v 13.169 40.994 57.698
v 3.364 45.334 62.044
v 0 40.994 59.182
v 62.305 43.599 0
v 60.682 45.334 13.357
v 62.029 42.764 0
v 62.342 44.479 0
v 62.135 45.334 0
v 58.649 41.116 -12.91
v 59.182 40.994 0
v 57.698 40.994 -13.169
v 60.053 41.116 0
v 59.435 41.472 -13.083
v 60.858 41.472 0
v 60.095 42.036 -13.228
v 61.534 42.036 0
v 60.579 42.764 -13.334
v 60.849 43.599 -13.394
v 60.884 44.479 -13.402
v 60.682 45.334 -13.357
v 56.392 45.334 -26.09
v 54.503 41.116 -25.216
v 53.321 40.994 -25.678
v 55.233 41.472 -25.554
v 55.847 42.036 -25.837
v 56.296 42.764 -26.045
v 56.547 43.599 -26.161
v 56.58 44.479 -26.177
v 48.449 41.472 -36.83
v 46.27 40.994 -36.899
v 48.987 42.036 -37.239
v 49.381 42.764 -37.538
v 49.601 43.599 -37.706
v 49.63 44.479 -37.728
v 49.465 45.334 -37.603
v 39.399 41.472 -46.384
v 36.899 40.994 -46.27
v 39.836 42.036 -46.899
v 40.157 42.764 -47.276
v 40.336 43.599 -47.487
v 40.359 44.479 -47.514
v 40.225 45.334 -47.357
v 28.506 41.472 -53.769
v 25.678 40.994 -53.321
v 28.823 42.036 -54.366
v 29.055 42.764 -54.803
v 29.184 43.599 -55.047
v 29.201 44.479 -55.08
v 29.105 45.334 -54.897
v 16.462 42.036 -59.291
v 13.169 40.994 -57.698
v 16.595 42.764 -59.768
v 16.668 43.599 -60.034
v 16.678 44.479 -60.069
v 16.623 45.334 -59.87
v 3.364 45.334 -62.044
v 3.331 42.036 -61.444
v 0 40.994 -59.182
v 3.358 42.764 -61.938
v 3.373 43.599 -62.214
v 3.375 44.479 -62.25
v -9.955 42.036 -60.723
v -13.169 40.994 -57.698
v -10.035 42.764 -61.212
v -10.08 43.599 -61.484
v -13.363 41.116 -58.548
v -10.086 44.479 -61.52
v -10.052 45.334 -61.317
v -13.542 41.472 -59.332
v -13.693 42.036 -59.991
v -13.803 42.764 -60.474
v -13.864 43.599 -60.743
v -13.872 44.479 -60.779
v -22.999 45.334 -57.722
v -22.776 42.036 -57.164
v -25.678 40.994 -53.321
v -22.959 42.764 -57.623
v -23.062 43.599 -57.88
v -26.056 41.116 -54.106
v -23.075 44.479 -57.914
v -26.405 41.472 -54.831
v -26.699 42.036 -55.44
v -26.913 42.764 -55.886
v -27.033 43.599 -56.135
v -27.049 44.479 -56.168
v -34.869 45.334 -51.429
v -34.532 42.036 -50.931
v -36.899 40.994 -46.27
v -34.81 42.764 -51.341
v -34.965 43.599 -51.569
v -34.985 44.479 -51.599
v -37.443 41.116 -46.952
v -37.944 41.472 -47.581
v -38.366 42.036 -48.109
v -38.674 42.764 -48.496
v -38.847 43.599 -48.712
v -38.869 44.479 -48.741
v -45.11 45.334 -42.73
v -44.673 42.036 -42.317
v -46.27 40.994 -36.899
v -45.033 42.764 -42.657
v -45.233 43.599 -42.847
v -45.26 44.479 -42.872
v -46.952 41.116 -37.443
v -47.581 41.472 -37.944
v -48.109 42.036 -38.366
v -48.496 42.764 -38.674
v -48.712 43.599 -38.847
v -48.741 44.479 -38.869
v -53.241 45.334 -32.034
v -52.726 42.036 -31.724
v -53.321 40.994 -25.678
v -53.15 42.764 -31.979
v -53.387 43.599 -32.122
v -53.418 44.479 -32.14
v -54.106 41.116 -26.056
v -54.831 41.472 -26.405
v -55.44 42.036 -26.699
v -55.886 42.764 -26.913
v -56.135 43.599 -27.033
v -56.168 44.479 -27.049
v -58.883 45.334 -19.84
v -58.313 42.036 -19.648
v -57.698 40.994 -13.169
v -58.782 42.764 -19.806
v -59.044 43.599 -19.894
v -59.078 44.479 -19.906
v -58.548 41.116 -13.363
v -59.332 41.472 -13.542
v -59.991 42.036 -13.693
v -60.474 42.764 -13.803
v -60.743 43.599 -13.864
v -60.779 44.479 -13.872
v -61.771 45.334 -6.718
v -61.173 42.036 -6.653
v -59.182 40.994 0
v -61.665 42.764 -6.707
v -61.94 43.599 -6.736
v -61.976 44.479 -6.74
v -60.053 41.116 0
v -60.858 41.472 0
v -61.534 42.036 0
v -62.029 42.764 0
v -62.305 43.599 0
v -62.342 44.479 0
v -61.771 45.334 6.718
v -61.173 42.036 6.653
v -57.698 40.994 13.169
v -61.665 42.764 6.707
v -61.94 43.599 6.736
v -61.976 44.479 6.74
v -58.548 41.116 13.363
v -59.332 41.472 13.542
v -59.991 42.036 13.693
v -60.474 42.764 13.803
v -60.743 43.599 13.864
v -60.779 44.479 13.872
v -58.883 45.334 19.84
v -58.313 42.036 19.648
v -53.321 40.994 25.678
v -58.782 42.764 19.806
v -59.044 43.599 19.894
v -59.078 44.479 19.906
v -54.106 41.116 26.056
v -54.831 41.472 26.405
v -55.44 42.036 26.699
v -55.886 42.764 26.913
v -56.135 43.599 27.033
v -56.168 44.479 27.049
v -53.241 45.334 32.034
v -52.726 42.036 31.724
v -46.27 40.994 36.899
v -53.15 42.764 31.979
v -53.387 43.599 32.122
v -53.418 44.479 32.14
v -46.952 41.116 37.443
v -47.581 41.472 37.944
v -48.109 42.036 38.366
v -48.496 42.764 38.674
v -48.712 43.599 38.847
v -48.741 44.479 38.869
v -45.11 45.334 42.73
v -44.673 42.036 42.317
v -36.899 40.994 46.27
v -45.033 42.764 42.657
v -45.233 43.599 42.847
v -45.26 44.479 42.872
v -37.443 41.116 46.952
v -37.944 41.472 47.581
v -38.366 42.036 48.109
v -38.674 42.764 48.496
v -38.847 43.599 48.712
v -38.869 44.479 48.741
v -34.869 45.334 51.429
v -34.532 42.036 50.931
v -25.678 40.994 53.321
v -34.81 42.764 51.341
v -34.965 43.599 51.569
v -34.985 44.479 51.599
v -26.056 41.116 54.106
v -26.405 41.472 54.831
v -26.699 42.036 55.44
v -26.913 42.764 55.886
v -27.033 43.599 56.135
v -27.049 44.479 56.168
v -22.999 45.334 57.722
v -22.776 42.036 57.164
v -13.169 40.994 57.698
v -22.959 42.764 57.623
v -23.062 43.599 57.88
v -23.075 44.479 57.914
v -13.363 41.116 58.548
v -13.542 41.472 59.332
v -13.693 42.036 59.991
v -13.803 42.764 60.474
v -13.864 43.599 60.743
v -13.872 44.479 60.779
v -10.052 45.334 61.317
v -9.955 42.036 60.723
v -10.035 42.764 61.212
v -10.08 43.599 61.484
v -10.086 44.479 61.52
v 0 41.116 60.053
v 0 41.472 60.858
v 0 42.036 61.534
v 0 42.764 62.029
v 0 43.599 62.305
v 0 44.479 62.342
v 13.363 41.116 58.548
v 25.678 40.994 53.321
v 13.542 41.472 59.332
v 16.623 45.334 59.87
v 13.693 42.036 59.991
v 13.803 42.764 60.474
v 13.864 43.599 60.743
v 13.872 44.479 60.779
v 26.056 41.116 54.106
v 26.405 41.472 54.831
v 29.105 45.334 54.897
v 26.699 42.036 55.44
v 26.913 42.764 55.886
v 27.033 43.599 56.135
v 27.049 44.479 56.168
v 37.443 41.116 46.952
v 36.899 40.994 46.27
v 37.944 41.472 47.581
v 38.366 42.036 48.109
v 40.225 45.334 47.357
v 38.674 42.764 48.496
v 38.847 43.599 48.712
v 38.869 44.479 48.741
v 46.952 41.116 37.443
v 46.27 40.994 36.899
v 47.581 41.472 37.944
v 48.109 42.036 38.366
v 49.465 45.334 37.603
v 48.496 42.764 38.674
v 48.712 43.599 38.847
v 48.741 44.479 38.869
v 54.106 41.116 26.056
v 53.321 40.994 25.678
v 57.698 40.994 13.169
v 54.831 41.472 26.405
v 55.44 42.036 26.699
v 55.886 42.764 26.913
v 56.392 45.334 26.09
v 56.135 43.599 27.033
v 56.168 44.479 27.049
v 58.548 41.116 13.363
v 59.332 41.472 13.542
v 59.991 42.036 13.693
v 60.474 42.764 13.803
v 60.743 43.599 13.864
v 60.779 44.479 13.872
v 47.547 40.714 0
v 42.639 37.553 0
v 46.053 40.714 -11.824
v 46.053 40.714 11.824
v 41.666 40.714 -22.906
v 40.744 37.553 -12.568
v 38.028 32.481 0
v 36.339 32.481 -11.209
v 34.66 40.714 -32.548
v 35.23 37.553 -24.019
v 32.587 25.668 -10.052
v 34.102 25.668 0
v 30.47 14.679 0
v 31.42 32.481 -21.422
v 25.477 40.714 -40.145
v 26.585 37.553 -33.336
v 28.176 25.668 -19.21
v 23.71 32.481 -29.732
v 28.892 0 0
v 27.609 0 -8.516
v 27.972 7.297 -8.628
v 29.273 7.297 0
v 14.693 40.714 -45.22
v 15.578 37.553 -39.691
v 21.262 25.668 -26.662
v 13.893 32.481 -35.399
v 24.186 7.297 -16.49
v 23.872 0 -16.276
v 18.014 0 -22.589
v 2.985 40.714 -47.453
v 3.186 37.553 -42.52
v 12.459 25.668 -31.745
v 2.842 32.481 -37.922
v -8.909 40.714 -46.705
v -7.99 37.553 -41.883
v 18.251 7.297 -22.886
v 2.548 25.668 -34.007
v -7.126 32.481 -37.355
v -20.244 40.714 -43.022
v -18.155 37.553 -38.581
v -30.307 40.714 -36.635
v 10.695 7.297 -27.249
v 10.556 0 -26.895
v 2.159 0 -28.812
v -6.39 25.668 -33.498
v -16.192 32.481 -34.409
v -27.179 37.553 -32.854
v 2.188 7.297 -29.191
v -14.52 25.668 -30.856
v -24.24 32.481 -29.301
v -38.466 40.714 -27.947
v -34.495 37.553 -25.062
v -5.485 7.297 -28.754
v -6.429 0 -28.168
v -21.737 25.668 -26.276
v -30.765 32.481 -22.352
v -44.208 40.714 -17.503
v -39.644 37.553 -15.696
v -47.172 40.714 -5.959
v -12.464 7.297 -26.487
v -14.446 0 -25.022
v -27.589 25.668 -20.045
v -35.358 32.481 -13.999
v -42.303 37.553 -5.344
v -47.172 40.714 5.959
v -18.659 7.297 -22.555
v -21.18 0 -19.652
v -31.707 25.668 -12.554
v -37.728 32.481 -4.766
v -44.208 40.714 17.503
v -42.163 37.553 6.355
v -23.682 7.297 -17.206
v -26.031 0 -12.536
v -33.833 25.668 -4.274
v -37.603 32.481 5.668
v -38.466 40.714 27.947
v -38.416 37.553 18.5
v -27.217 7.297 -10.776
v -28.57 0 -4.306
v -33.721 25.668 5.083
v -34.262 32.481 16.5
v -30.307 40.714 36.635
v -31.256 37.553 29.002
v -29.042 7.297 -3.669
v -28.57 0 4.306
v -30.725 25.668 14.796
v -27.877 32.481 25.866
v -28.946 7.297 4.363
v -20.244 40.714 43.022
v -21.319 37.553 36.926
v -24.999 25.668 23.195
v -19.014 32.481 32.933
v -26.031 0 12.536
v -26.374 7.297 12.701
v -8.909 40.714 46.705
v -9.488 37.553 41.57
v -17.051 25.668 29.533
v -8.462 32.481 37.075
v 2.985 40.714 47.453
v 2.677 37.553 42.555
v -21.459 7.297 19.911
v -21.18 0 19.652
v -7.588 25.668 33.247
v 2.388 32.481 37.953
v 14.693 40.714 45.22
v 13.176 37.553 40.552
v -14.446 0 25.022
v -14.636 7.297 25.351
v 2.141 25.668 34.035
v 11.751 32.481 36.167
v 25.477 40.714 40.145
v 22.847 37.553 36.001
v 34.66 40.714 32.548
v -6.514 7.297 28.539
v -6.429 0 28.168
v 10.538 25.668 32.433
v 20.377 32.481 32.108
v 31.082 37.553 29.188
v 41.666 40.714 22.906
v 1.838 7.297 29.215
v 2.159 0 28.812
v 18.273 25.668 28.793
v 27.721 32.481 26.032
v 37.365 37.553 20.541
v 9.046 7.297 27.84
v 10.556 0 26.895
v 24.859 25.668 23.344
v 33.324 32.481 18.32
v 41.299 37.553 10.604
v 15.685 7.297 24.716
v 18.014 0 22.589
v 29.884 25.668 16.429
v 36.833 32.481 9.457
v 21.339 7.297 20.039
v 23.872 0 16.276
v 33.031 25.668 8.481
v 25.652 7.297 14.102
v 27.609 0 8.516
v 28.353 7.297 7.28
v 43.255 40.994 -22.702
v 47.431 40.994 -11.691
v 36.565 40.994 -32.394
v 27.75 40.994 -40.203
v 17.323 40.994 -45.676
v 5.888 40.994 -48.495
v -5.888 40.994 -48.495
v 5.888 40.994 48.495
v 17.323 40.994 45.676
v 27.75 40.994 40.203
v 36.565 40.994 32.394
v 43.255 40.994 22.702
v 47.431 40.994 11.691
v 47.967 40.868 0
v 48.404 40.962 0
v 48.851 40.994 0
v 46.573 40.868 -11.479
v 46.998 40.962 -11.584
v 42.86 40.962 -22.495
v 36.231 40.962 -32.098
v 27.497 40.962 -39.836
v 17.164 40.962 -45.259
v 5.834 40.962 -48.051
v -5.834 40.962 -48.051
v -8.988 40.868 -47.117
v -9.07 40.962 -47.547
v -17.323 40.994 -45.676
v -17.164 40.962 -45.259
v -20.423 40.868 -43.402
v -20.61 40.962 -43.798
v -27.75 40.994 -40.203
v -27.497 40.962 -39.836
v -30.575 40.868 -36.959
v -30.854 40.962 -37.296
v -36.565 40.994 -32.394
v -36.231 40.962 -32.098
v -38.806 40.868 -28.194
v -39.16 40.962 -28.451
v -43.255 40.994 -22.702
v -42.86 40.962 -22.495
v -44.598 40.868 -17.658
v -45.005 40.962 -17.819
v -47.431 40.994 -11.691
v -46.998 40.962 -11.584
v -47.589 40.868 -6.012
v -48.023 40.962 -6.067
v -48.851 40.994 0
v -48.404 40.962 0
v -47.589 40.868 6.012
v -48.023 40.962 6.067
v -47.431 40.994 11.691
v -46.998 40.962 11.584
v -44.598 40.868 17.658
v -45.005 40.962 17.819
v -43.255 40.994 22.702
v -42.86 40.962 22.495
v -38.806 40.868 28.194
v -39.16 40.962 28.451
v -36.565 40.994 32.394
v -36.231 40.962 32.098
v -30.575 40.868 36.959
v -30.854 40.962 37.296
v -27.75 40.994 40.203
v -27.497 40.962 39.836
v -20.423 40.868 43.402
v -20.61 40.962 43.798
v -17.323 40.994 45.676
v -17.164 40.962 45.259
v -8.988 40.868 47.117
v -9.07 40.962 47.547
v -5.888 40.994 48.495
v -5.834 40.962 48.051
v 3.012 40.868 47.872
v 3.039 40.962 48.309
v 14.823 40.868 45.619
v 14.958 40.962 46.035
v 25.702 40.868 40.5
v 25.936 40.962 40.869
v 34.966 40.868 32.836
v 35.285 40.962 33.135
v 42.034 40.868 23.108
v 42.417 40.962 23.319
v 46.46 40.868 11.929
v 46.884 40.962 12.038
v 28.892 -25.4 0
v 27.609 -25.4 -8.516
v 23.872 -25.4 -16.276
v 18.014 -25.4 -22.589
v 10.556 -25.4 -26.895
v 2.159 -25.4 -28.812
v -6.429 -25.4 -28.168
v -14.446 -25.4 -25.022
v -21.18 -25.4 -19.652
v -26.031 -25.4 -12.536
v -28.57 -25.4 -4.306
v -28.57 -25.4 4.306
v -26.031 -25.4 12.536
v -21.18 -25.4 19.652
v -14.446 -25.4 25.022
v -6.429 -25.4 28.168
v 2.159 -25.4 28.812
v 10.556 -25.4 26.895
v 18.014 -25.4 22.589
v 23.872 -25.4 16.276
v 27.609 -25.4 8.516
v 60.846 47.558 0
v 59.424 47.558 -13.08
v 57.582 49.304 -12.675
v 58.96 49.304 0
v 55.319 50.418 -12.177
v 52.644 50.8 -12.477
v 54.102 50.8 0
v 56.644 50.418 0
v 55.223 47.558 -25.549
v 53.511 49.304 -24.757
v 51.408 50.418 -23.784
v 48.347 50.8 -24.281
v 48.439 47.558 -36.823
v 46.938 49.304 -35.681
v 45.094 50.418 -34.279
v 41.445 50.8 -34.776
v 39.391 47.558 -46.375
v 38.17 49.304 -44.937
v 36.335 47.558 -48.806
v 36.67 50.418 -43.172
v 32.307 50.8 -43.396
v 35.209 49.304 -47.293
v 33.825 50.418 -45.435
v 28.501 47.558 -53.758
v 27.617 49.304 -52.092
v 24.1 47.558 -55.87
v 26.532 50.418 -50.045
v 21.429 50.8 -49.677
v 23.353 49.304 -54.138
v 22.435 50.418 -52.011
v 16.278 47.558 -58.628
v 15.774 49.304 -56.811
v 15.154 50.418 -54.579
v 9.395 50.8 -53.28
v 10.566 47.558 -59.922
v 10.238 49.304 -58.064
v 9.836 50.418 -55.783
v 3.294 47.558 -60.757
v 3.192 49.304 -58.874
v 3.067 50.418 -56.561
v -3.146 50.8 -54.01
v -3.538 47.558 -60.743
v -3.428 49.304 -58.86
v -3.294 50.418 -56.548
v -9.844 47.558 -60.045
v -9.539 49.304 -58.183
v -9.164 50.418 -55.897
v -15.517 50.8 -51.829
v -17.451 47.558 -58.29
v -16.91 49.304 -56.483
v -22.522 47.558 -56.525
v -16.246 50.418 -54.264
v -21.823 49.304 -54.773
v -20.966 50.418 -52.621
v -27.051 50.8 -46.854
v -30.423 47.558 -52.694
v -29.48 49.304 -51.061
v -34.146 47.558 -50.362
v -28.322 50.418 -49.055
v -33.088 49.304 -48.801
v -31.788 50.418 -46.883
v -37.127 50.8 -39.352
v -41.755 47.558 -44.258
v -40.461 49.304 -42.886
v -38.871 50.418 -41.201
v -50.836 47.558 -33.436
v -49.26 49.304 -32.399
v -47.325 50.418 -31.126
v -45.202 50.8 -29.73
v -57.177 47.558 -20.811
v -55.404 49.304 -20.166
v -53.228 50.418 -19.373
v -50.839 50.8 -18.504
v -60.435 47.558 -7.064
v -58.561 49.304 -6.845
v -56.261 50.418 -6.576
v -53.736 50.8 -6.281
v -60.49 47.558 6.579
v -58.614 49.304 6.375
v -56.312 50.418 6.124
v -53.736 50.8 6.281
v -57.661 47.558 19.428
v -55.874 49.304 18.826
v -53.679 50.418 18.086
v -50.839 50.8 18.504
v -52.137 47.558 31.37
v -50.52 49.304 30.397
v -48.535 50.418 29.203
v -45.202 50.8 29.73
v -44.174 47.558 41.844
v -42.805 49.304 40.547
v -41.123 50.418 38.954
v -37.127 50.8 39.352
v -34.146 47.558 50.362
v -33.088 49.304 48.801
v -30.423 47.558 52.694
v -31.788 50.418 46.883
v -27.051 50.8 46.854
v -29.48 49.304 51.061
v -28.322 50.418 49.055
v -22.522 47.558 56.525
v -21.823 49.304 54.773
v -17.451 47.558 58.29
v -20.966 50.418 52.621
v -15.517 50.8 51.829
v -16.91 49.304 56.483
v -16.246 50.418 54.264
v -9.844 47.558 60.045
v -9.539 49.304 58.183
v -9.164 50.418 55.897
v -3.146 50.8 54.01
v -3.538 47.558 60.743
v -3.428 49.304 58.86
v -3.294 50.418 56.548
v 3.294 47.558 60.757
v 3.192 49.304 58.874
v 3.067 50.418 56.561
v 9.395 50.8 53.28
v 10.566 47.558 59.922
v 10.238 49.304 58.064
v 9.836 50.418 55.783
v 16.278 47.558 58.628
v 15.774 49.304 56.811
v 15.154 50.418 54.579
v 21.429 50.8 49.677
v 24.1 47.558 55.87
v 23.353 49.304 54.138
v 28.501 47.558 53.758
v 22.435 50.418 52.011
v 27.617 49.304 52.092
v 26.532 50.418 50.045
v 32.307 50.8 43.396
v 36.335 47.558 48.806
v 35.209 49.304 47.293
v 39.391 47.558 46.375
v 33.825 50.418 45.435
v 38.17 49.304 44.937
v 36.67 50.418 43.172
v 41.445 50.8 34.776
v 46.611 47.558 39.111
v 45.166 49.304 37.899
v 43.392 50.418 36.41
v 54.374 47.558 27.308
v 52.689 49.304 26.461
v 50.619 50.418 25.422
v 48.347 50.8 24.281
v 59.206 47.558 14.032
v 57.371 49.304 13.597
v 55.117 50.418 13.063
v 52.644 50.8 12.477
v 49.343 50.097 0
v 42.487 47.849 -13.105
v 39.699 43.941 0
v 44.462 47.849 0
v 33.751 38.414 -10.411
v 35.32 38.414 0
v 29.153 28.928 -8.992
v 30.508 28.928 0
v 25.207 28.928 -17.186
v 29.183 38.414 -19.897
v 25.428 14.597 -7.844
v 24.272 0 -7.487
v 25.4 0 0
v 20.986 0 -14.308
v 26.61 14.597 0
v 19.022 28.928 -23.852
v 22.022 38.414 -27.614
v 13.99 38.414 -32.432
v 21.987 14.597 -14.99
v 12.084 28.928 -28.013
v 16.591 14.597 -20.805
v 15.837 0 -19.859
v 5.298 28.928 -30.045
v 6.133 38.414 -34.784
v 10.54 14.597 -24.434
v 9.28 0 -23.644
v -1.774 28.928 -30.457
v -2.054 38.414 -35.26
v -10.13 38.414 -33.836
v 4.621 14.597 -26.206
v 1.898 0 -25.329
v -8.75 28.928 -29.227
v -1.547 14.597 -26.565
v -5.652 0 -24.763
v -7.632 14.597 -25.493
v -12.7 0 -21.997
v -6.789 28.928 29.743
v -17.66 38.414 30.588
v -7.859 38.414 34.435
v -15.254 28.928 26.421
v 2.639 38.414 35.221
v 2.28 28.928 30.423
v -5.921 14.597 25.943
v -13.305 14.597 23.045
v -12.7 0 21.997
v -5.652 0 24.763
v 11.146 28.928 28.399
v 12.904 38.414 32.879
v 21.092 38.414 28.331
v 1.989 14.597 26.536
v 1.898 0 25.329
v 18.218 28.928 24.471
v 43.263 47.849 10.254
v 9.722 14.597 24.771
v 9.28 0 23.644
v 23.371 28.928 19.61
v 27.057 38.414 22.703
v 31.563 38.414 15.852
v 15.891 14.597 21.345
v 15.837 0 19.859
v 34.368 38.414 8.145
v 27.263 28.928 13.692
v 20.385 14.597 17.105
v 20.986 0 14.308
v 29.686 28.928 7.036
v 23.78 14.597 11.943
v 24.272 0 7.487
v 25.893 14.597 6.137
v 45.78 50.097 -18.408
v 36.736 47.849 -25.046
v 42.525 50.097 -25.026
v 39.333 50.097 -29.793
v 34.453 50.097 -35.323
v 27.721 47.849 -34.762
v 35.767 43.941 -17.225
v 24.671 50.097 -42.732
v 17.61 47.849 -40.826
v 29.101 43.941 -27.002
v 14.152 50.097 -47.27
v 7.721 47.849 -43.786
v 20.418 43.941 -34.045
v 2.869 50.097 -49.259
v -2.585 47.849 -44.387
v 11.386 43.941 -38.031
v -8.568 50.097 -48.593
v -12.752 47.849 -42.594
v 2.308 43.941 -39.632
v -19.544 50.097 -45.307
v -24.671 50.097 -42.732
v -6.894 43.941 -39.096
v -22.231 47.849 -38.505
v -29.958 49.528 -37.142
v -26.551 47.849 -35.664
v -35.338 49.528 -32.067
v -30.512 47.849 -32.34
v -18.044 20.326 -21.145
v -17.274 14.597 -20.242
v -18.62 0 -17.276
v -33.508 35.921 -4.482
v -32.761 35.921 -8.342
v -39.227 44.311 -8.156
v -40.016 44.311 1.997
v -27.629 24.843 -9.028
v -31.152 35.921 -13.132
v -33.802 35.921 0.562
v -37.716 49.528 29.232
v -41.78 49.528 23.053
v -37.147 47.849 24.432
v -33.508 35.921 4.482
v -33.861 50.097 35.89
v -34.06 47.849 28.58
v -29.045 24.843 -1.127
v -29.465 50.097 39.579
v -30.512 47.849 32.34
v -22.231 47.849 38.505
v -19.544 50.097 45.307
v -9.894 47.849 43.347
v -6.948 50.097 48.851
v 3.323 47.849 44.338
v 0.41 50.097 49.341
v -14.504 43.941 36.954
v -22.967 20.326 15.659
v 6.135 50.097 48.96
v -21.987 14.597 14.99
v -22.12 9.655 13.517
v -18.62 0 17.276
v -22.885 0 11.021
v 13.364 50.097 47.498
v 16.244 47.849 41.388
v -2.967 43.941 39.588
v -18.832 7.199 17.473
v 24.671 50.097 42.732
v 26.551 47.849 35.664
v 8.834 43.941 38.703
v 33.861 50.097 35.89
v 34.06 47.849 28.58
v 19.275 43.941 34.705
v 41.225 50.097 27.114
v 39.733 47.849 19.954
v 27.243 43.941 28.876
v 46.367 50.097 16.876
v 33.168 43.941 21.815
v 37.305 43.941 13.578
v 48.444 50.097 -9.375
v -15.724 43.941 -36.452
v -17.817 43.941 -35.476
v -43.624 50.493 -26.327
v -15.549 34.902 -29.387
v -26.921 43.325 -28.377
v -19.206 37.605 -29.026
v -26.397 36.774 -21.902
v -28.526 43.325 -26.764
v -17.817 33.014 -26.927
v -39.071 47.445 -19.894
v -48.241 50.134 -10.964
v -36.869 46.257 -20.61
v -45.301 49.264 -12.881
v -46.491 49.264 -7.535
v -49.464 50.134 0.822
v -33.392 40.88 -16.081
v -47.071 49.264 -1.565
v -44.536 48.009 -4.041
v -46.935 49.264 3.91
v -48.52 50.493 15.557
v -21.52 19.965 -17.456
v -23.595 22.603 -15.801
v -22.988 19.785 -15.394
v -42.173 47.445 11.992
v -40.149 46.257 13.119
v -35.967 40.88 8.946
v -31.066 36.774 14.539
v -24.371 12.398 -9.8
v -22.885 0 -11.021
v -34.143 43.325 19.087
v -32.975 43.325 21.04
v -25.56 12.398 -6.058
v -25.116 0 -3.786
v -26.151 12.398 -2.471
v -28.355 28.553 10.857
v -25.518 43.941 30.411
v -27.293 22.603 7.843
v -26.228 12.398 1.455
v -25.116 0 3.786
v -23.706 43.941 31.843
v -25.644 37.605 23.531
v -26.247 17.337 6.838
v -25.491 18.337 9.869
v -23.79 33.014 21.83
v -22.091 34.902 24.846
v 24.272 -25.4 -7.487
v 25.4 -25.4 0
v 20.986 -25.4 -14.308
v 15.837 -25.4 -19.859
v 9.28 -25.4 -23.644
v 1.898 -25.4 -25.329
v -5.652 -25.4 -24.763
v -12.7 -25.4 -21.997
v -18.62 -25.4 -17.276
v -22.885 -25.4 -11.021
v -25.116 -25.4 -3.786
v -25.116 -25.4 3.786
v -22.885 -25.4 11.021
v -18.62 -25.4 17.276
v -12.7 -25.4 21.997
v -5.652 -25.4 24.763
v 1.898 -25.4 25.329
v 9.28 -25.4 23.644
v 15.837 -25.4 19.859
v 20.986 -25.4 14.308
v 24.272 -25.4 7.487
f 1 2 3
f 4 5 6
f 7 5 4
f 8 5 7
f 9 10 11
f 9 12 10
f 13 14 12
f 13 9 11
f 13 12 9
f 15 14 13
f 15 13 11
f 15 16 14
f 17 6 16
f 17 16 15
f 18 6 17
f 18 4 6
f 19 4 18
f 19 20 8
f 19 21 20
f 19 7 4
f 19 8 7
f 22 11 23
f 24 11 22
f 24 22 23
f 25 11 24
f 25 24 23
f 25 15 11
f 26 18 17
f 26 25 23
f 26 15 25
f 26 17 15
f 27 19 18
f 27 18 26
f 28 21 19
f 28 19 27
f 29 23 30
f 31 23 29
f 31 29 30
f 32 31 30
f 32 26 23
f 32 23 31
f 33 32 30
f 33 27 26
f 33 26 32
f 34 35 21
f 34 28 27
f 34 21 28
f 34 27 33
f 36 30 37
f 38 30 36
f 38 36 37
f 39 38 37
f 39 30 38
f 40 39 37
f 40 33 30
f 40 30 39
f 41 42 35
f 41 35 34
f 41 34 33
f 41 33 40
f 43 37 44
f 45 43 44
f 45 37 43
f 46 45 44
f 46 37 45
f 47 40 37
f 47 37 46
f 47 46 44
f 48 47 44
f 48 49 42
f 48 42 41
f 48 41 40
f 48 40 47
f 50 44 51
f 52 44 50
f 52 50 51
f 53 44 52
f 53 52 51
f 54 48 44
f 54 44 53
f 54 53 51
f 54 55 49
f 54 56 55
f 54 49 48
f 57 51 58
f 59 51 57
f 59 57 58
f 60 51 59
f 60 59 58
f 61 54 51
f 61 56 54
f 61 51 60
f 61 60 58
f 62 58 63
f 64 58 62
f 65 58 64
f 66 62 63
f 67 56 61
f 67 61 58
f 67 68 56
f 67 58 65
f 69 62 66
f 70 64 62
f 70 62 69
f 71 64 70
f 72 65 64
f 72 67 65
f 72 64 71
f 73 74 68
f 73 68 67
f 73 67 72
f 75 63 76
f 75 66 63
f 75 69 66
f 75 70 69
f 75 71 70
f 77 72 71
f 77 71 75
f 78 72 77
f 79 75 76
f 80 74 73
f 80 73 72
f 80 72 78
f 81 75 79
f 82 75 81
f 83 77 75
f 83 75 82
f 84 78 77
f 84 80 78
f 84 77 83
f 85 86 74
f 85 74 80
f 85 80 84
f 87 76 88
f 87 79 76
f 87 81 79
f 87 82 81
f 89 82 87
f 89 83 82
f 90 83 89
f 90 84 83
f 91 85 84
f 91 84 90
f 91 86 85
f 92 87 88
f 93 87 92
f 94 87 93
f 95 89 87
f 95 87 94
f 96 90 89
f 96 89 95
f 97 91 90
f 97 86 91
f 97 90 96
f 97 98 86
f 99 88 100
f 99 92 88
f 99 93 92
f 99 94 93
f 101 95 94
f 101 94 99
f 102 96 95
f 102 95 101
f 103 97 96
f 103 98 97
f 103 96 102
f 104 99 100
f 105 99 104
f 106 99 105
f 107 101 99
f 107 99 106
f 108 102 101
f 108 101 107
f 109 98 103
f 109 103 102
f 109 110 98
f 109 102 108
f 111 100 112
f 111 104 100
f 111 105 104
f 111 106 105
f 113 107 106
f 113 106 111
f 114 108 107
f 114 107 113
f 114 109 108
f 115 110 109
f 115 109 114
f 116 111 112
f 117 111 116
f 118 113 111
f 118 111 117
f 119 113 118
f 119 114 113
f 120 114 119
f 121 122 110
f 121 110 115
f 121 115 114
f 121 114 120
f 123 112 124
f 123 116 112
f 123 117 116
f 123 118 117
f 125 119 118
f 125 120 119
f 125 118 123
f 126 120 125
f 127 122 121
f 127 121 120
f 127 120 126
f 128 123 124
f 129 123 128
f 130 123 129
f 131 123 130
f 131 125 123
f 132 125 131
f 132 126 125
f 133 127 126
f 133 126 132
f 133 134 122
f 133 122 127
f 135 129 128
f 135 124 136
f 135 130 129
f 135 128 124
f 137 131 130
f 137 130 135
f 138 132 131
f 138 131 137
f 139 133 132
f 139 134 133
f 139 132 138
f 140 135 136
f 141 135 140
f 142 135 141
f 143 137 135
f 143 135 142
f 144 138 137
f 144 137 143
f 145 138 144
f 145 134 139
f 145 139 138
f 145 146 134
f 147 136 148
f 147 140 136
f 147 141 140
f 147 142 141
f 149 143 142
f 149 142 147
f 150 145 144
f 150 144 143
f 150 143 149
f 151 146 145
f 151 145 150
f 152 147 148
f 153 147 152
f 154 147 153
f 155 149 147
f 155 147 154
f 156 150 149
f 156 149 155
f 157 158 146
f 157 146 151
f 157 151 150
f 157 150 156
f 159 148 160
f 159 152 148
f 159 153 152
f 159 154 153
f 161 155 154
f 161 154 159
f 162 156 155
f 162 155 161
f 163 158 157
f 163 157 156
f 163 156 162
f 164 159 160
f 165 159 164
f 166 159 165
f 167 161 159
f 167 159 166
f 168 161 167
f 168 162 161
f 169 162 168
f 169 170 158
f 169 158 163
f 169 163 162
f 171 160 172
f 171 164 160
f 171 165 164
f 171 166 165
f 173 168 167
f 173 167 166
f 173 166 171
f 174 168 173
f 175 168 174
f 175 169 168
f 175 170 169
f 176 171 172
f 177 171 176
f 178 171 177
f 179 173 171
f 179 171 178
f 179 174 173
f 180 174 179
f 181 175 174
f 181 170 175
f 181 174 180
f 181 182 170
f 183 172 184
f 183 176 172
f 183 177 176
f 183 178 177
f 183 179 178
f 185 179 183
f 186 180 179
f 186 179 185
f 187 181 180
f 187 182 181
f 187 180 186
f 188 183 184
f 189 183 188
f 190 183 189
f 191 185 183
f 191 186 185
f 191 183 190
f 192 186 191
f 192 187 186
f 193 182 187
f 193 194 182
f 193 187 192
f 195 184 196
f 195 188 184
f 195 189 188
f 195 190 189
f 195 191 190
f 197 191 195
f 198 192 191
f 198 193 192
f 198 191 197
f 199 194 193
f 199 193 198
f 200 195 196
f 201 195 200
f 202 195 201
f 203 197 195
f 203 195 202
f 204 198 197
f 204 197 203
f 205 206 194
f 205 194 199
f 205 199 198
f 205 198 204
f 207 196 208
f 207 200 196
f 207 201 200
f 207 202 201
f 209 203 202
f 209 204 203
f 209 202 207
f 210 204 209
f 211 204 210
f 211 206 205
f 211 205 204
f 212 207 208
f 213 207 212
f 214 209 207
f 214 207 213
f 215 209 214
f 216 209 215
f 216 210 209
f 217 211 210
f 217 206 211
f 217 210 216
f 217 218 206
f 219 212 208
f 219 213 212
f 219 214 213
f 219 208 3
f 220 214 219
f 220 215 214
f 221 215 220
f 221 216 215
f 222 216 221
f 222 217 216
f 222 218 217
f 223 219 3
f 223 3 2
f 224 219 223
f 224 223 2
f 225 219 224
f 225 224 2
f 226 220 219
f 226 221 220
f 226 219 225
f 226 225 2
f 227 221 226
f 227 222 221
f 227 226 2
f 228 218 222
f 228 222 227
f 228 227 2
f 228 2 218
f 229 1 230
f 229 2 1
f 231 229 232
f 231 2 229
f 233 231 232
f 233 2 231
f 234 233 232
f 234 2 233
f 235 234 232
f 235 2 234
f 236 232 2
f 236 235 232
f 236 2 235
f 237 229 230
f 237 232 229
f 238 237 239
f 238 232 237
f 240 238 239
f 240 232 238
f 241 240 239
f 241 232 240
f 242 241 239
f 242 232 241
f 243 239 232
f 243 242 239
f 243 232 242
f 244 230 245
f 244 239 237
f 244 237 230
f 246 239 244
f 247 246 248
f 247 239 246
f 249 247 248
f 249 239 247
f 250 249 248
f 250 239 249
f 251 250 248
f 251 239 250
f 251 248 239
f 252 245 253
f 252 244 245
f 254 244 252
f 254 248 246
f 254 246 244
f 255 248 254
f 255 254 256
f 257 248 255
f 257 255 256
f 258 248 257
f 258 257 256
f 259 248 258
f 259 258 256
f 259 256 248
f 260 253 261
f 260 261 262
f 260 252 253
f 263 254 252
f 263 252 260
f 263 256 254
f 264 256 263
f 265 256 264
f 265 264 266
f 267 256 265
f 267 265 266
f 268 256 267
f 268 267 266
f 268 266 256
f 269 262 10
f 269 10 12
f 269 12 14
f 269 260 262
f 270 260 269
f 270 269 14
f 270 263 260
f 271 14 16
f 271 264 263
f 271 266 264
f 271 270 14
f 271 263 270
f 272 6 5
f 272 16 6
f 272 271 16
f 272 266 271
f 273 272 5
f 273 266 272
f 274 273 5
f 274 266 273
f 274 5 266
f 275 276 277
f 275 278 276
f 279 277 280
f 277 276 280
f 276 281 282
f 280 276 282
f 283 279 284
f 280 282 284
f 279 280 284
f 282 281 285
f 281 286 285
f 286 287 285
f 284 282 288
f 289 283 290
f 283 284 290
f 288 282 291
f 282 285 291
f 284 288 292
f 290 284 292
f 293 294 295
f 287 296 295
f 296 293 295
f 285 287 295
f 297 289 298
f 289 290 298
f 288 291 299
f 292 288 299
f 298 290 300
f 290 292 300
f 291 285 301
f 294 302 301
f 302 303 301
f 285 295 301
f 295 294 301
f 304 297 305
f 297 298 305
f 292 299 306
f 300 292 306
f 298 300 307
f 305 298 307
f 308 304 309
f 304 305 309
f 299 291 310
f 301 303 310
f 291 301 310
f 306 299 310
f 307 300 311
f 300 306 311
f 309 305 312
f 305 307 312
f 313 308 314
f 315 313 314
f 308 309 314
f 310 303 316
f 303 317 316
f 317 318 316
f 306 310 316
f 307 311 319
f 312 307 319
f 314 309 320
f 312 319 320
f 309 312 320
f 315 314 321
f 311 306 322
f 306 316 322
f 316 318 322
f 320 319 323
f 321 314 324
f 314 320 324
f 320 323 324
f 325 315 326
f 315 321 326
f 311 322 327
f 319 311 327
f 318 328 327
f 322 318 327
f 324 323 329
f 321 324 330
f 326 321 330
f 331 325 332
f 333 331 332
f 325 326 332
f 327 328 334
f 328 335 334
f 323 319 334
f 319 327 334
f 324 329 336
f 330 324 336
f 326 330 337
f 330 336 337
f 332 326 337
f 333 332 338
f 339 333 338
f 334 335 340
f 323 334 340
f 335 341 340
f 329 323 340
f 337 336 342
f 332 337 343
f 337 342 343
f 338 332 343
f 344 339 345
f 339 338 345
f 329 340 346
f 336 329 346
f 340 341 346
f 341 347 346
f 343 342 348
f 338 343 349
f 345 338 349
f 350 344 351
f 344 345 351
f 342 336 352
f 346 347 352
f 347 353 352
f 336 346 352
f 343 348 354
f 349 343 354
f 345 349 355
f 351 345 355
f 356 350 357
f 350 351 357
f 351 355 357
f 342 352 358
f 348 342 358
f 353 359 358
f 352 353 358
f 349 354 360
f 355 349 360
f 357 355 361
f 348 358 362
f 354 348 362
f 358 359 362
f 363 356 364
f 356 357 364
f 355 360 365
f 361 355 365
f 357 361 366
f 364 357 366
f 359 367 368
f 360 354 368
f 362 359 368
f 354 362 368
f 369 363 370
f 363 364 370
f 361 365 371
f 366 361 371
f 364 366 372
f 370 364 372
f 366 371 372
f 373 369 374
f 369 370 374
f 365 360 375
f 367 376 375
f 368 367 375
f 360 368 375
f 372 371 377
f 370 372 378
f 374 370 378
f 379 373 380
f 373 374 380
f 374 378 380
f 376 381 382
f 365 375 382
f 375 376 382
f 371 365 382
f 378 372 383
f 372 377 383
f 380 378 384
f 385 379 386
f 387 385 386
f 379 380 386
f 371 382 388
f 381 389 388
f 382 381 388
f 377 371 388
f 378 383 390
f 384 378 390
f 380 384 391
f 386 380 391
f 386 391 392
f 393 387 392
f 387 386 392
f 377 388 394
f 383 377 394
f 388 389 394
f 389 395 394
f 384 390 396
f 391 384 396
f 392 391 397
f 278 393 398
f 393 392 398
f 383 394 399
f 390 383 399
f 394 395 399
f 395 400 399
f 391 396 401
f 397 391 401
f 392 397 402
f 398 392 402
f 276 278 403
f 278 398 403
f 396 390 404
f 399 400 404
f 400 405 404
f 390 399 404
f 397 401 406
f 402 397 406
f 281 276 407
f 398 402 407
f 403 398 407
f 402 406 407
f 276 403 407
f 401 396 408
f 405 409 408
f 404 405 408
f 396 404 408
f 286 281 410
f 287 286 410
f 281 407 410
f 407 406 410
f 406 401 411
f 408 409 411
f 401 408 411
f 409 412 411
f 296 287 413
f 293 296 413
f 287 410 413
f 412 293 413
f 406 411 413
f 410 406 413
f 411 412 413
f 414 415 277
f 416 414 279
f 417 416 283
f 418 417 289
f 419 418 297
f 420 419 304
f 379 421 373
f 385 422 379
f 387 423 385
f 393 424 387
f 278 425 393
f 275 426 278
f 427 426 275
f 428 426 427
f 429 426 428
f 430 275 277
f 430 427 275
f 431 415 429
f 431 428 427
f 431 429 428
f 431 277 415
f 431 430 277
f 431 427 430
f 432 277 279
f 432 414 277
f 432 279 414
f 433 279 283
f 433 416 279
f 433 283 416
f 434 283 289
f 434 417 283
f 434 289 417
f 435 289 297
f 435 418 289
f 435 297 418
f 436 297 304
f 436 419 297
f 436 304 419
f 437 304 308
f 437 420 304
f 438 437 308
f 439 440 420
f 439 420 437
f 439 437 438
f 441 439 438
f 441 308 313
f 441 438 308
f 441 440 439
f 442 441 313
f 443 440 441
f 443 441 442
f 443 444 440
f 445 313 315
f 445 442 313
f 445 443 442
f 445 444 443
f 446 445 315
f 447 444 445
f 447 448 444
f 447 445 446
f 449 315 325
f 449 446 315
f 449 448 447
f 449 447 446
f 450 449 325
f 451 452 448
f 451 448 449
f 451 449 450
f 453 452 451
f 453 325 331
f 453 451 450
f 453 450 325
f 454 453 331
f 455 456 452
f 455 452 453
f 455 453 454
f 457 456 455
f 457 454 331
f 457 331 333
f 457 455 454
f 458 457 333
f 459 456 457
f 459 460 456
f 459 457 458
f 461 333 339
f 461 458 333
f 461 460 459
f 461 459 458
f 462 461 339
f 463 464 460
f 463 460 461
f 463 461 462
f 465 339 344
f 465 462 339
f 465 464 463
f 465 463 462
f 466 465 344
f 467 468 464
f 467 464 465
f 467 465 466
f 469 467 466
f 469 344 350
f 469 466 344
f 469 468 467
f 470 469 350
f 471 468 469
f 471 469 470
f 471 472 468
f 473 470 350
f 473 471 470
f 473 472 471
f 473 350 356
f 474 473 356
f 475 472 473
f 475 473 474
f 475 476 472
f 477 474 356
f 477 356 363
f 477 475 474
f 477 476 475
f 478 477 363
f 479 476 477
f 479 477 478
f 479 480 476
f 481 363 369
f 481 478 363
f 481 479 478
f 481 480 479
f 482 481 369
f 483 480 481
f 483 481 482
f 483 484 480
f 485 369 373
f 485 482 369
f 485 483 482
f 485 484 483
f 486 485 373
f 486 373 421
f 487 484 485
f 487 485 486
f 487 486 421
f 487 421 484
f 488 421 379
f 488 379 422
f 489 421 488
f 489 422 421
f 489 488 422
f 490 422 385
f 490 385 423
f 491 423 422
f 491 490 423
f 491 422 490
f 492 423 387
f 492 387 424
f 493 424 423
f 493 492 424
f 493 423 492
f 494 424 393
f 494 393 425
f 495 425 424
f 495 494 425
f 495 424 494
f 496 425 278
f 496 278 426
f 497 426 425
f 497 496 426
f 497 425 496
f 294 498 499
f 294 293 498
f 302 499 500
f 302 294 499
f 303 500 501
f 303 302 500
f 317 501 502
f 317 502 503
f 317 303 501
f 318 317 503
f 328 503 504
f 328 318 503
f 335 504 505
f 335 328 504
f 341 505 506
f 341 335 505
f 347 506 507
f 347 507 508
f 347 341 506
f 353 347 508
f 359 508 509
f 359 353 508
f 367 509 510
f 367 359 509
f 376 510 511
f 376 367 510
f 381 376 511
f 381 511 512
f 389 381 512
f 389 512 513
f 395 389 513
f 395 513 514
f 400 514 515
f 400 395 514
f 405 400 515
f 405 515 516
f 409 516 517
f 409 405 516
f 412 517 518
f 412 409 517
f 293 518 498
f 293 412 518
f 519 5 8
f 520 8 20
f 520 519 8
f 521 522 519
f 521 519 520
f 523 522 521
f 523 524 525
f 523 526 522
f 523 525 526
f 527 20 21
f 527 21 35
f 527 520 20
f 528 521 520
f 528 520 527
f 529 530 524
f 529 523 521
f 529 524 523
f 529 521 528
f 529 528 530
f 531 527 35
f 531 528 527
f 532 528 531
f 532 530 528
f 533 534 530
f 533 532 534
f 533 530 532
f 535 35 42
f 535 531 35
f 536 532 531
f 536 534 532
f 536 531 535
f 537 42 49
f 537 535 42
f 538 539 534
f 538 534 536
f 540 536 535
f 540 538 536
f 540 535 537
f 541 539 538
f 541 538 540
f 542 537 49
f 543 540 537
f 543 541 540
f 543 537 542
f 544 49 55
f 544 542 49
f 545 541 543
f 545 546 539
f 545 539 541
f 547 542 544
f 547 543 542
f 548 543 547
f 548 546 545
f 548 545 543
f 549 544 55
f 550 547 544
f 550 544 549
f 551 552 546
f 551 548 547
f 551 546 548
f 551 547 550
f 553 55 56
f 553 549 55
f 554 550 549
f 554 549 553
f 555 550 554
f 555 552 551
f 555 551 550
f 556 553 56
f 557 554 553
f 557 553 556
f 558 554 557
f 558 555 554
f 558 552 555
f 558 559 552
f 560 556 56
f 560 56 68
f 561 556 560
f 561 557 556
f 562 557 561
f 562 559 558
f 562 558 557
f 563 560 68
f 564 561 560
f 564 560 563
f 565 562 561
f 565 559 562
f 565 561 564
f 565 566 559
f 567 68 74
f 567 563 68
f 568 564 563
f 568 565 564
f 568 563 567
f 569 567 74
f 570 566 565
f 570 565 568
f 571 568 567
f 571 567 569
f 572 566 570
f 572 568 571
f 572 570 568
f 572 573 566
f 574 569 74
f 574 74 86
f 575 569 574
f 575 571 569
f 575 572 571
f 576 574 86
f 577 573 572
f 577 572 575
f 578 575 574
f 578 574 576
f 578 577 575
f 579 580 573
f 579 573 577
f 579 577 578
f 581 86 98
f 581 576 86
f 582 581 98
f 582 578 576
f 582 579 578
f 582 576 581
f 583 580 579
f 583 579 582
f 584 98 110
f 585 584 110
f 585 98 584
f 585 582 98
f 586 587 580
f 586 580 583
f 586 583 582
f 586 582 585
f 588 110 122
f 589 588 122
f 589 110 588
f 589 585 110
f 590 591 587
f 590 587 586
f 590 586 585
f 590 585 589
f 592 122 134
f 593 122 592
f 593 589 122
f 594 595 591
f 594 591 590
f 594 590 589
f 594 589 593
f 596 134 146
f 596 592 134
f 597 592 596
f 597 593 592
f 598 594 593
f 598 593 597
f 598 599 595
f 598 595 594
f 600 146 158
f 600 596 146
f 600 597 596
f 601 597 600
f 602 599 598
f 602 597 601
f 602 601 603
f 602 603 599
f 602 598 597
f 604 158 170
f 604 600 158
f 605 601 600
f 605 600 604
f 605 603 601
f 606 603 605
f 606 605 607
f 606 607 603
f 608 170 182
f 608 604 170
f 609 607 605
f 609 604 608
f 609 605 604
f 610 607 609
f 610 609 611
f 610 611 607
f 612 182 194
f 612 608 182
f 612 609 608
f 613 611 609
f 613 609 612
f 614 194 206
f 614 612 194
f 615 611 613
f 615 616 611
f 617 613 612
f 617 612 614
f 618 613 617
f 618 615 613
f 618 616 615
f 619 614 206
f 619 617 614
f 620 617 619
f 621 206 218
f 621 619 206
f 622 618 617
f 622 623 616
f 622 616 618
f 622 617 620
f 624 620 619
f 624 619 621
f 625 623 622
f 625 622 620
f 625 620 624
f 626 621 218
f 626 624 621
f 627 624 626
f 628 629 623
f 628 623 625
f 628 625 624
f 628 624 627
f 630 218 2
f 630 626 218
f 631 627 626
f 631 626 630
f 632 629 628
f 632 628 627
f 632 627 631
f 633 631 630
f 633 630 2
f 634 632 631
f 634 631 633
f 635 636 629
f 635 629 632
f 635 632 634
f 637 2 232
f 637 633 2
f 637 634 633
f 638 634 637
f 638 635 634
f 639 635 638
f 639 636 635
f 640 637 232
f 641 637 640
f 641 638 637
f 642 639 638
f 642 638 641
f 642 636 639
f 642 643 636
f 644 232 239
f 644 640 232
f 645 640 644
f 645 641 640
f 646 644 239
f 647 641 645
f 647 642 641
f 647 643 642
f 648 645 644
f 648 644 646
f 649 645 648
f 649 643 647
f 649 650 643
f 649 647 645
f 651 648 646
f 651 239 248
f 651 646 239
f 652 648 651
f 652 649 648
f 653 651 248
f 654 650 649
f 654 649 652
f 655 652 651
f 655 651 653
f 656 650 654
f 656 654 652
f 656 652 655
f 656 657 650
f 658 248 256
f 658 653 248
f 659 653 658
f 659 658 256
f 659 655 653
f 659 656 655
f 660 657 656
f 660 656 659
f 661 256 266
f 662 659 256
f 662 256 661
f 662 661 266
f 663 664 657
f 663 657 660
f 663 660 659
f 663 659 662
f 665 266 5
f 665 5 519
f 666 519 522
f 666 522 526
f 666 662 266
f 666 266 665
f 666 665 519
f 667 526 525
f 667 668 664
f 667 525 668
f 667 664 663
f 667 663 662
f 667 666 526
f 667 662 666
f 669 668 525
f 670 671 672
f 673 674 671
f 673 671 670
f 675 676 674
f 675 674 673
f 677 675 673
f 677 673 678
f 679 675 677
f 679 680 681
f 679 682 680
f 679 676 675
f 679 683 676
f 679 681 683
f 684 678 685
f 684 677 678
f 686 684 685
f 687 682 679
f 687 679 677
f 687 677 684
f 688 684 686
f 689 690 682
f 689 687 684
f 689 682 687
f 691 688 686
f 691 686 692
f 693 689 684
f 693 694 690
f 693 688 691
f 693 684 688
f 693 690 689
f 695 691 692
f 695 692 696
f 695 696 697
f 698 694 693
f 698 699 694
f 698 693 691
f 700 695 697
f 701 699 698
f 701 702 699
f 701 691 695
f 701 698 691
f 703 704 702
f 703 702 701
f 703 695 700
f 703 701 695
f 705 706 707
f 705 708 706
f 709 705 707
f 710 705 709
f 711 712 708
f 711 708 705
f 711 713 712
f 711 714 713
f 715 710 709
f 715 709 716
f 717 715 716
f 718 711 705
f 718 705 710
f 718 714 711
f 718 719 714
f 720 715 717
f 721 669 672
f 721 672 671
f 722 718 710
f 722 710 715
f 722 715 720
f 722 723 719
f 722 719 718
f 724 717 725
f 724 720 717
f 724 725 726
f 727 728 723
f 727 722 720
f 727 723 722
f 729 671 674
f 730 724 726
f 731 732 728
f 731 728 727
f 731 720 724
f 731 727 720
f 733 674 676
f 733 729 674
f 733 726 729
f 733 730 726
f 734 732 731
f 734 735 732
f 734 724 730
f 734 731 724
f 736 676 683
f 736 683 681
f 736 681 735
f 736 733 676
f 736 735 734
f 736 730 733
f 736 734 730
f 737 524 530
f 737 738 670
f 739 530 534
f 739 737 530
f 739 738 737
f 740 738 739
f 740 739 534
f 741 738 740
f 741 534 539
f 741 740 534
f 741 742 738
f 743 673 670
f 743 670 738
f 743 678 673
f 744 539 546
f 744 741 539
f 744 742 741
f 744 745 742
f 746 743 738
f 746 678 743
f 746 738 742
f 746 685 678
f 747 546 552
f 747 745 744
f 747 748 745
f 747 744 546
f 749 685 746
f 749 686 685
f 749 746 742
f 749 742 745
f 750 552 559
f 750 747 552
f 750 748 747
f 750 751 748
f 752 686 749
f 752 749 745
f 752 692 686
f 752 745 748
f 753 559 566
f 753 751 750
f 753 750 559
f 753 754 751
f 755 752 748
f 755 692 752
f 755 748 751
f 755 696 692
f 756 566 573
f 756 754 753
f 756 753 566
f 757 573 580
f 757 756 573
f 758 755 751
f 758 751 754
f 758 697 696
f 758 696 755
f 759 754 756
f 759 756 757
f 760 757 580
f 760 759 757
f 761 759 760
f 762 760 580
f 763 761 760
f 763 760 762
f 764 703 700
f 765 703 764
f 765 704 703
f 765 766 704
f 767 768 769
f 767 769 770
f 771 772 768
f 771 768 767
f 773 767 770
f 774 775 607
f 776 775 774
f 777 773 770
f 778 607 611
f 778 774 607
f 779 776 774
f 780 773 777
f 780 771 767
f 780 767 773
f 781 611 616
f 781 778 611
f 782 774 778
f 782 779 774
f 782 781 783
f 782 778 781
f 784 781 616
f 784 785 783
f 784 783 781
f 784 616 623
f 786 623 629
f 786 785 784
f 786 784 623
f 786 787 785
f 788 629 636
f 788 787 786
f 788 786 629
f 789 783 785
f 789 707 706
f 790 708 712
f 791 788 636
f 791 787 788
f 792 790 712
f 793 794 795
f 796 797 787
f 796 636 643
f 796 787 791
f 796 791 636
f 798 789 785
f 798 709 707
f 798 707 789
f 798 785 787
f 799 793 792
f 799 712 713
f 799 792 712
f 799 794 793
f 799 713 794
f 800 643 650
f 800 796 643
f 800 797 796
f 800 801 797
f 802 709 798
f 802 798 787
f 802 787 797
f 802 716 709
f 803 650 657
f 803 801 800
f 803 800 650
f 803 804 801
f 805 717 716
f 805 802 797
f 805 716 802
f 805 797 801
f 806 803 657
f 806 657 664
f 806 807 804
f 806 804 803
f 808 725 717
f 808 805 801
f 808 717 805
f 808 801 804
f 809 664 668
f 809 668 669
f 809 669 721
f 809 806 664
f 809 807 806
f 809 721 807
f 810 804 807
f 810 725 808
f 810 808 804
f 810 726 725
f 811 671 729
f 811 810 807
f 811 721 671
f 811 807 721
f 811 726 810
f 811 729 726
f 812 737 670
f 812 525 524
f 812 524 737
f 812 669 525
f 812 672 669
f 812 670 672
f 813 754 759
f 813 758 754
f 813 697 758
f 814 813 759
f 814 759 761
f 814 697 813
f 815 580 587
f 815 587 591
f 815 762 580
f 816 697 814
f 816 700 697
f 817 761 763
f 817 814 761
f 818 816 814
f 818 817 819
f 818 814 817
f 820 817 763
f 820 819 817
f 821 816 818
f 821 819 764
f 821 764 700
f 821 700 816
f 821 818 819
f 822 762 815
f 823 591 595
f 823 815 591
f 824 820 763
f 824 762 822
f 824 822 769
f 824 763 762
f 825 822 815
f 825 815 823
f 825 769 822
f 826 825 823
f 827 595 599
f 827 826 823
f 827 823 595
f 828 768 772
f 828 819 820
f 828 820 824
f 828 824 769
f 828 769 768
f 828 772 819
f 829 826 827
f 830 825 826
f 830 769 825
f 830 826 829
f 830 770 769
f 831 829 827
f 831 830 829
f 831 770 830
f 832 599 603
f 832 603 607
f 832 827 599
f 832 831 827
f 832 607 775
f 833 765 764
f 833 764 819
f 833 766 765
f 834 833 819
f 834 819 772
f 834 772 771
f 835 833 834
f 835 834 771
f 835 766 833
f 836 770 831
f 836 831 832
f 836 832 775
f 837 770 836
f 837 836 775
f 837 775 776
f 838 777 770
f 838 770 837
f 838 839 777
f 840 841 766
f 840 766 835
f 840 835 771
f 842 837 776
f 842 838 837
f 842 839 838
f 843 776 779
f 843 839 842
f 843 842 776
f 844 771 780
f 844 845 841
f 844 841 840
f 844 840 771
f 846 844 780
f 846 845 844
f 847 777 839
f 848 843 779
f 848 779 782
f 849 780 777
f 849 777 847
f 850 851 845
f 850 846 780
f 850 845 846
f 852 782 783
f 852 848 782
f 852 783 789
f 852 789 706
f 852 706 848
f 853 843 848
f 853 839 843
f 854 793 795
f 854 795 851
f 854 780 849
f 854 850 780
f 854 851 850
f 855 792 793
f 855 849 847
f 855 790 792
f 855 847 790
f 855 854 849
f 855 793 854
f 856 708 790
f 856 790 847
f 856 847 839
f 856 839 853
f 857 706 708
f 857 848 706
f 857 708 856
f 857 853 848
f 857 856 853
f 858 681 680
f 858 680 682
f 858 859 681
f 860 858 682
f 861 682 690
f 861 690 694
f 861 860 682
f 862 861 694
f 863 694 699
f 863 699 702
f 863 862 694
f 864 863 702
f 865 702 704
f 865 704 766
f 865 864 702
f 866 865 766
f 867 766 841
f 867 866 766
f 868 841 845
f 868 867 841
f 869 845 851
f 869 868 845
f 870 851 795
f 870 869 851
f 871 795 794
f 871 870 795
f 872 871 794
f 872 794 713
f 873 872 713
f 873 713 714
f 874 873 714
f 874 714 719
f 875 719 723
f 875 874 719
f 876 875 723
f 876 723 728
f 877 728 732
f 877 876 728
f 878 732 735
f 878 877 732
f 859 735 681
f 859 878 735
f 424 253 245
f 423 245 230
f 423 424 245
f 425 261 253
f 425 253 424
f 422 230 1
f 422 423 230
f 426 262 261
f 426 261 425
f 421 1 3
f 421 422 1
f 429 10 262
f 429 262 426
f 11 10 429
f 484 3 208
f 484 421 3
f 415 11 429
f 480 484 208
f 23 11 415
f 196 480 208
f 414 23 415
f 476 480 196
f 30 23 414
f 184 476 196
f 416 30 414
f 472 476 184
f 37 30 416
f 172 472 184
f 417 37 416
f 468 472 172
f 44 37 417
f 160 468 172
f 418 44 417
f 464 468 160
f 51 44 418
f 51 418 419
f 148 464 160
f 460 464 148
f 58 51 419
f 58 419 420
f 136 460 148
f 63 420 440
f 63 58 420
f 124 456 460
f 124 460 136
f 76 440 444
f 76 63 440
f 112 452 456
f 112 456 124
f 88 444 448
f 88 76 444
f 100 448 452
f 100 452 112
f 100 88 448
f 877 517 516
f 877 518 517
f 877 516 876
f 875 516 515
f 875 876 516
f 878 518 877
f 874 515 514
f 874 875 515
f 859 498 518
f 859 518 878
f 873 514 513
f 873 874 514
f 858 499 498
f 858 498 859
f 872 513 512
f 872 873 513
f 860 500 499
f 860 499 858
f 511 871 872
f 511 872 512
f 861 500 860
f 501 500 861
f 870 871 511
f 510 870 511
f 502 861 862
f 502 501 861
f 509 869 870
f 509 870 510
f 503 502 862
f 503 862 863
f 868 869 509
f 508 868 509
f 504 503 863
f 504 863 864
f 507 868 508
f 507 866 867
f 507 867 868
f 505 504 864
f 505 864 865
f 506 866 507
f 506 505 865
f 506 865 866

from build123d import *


with BuildPart() as f1:
    # F0 (on Top) → F1 (revolve)
    with BuildSketch(Plane.XY):
        with BuildLine():
            ThreePointArc((59.1817405743, 40.9936836903), (61.8067292629, 42.3826099559), (62.1350781175, 45.3341974637))
            ThreePointArc((62.1350781175, 45.3341974637), (58.9601205576, 49.303969233), (54.102, 50.8))
            add(Edge.make_bspline(
                [(54.102, 50.8), (25.4, 50.8), (25.4, 0)],
                knots=[0, 0, 0, 1.5707963268, 1.5707963268, 1.5707963268], degree=2, weights=[1, 0.7071067812, 1]))
            Line((25.4, 0), (25.4, -25.4))
            Line((25.4, -25.4), (28.8925, -25.4))
            Line((28.8925, -25.4), (28.8925, 0))
            add(Edge.make_bspline(
                [(47.5468117709, 40.7135982273), (28.8925, 32.3116489326), (28.8925, 0)],
                knots=[0.2630517082, 0.2630517082, 0.2630517082, 1.5707963268, 1.5707963268, 1.5707963268], degree=2, weights=[1, 0.7937343669, 1]))
            ThreePointArc((47.5468117709, 40.7135982273), (48.1838785423, 40.922872687), (48.8506886146, 40.9936836903))
            Line((48.8506886146, 40.9936836903), (59.1817405743, 40.9936836903))
        make_face()
    revolve(axis=Axis((0, 35.1700206795, 0), (0, 1, 0)))


solid = f1.part
